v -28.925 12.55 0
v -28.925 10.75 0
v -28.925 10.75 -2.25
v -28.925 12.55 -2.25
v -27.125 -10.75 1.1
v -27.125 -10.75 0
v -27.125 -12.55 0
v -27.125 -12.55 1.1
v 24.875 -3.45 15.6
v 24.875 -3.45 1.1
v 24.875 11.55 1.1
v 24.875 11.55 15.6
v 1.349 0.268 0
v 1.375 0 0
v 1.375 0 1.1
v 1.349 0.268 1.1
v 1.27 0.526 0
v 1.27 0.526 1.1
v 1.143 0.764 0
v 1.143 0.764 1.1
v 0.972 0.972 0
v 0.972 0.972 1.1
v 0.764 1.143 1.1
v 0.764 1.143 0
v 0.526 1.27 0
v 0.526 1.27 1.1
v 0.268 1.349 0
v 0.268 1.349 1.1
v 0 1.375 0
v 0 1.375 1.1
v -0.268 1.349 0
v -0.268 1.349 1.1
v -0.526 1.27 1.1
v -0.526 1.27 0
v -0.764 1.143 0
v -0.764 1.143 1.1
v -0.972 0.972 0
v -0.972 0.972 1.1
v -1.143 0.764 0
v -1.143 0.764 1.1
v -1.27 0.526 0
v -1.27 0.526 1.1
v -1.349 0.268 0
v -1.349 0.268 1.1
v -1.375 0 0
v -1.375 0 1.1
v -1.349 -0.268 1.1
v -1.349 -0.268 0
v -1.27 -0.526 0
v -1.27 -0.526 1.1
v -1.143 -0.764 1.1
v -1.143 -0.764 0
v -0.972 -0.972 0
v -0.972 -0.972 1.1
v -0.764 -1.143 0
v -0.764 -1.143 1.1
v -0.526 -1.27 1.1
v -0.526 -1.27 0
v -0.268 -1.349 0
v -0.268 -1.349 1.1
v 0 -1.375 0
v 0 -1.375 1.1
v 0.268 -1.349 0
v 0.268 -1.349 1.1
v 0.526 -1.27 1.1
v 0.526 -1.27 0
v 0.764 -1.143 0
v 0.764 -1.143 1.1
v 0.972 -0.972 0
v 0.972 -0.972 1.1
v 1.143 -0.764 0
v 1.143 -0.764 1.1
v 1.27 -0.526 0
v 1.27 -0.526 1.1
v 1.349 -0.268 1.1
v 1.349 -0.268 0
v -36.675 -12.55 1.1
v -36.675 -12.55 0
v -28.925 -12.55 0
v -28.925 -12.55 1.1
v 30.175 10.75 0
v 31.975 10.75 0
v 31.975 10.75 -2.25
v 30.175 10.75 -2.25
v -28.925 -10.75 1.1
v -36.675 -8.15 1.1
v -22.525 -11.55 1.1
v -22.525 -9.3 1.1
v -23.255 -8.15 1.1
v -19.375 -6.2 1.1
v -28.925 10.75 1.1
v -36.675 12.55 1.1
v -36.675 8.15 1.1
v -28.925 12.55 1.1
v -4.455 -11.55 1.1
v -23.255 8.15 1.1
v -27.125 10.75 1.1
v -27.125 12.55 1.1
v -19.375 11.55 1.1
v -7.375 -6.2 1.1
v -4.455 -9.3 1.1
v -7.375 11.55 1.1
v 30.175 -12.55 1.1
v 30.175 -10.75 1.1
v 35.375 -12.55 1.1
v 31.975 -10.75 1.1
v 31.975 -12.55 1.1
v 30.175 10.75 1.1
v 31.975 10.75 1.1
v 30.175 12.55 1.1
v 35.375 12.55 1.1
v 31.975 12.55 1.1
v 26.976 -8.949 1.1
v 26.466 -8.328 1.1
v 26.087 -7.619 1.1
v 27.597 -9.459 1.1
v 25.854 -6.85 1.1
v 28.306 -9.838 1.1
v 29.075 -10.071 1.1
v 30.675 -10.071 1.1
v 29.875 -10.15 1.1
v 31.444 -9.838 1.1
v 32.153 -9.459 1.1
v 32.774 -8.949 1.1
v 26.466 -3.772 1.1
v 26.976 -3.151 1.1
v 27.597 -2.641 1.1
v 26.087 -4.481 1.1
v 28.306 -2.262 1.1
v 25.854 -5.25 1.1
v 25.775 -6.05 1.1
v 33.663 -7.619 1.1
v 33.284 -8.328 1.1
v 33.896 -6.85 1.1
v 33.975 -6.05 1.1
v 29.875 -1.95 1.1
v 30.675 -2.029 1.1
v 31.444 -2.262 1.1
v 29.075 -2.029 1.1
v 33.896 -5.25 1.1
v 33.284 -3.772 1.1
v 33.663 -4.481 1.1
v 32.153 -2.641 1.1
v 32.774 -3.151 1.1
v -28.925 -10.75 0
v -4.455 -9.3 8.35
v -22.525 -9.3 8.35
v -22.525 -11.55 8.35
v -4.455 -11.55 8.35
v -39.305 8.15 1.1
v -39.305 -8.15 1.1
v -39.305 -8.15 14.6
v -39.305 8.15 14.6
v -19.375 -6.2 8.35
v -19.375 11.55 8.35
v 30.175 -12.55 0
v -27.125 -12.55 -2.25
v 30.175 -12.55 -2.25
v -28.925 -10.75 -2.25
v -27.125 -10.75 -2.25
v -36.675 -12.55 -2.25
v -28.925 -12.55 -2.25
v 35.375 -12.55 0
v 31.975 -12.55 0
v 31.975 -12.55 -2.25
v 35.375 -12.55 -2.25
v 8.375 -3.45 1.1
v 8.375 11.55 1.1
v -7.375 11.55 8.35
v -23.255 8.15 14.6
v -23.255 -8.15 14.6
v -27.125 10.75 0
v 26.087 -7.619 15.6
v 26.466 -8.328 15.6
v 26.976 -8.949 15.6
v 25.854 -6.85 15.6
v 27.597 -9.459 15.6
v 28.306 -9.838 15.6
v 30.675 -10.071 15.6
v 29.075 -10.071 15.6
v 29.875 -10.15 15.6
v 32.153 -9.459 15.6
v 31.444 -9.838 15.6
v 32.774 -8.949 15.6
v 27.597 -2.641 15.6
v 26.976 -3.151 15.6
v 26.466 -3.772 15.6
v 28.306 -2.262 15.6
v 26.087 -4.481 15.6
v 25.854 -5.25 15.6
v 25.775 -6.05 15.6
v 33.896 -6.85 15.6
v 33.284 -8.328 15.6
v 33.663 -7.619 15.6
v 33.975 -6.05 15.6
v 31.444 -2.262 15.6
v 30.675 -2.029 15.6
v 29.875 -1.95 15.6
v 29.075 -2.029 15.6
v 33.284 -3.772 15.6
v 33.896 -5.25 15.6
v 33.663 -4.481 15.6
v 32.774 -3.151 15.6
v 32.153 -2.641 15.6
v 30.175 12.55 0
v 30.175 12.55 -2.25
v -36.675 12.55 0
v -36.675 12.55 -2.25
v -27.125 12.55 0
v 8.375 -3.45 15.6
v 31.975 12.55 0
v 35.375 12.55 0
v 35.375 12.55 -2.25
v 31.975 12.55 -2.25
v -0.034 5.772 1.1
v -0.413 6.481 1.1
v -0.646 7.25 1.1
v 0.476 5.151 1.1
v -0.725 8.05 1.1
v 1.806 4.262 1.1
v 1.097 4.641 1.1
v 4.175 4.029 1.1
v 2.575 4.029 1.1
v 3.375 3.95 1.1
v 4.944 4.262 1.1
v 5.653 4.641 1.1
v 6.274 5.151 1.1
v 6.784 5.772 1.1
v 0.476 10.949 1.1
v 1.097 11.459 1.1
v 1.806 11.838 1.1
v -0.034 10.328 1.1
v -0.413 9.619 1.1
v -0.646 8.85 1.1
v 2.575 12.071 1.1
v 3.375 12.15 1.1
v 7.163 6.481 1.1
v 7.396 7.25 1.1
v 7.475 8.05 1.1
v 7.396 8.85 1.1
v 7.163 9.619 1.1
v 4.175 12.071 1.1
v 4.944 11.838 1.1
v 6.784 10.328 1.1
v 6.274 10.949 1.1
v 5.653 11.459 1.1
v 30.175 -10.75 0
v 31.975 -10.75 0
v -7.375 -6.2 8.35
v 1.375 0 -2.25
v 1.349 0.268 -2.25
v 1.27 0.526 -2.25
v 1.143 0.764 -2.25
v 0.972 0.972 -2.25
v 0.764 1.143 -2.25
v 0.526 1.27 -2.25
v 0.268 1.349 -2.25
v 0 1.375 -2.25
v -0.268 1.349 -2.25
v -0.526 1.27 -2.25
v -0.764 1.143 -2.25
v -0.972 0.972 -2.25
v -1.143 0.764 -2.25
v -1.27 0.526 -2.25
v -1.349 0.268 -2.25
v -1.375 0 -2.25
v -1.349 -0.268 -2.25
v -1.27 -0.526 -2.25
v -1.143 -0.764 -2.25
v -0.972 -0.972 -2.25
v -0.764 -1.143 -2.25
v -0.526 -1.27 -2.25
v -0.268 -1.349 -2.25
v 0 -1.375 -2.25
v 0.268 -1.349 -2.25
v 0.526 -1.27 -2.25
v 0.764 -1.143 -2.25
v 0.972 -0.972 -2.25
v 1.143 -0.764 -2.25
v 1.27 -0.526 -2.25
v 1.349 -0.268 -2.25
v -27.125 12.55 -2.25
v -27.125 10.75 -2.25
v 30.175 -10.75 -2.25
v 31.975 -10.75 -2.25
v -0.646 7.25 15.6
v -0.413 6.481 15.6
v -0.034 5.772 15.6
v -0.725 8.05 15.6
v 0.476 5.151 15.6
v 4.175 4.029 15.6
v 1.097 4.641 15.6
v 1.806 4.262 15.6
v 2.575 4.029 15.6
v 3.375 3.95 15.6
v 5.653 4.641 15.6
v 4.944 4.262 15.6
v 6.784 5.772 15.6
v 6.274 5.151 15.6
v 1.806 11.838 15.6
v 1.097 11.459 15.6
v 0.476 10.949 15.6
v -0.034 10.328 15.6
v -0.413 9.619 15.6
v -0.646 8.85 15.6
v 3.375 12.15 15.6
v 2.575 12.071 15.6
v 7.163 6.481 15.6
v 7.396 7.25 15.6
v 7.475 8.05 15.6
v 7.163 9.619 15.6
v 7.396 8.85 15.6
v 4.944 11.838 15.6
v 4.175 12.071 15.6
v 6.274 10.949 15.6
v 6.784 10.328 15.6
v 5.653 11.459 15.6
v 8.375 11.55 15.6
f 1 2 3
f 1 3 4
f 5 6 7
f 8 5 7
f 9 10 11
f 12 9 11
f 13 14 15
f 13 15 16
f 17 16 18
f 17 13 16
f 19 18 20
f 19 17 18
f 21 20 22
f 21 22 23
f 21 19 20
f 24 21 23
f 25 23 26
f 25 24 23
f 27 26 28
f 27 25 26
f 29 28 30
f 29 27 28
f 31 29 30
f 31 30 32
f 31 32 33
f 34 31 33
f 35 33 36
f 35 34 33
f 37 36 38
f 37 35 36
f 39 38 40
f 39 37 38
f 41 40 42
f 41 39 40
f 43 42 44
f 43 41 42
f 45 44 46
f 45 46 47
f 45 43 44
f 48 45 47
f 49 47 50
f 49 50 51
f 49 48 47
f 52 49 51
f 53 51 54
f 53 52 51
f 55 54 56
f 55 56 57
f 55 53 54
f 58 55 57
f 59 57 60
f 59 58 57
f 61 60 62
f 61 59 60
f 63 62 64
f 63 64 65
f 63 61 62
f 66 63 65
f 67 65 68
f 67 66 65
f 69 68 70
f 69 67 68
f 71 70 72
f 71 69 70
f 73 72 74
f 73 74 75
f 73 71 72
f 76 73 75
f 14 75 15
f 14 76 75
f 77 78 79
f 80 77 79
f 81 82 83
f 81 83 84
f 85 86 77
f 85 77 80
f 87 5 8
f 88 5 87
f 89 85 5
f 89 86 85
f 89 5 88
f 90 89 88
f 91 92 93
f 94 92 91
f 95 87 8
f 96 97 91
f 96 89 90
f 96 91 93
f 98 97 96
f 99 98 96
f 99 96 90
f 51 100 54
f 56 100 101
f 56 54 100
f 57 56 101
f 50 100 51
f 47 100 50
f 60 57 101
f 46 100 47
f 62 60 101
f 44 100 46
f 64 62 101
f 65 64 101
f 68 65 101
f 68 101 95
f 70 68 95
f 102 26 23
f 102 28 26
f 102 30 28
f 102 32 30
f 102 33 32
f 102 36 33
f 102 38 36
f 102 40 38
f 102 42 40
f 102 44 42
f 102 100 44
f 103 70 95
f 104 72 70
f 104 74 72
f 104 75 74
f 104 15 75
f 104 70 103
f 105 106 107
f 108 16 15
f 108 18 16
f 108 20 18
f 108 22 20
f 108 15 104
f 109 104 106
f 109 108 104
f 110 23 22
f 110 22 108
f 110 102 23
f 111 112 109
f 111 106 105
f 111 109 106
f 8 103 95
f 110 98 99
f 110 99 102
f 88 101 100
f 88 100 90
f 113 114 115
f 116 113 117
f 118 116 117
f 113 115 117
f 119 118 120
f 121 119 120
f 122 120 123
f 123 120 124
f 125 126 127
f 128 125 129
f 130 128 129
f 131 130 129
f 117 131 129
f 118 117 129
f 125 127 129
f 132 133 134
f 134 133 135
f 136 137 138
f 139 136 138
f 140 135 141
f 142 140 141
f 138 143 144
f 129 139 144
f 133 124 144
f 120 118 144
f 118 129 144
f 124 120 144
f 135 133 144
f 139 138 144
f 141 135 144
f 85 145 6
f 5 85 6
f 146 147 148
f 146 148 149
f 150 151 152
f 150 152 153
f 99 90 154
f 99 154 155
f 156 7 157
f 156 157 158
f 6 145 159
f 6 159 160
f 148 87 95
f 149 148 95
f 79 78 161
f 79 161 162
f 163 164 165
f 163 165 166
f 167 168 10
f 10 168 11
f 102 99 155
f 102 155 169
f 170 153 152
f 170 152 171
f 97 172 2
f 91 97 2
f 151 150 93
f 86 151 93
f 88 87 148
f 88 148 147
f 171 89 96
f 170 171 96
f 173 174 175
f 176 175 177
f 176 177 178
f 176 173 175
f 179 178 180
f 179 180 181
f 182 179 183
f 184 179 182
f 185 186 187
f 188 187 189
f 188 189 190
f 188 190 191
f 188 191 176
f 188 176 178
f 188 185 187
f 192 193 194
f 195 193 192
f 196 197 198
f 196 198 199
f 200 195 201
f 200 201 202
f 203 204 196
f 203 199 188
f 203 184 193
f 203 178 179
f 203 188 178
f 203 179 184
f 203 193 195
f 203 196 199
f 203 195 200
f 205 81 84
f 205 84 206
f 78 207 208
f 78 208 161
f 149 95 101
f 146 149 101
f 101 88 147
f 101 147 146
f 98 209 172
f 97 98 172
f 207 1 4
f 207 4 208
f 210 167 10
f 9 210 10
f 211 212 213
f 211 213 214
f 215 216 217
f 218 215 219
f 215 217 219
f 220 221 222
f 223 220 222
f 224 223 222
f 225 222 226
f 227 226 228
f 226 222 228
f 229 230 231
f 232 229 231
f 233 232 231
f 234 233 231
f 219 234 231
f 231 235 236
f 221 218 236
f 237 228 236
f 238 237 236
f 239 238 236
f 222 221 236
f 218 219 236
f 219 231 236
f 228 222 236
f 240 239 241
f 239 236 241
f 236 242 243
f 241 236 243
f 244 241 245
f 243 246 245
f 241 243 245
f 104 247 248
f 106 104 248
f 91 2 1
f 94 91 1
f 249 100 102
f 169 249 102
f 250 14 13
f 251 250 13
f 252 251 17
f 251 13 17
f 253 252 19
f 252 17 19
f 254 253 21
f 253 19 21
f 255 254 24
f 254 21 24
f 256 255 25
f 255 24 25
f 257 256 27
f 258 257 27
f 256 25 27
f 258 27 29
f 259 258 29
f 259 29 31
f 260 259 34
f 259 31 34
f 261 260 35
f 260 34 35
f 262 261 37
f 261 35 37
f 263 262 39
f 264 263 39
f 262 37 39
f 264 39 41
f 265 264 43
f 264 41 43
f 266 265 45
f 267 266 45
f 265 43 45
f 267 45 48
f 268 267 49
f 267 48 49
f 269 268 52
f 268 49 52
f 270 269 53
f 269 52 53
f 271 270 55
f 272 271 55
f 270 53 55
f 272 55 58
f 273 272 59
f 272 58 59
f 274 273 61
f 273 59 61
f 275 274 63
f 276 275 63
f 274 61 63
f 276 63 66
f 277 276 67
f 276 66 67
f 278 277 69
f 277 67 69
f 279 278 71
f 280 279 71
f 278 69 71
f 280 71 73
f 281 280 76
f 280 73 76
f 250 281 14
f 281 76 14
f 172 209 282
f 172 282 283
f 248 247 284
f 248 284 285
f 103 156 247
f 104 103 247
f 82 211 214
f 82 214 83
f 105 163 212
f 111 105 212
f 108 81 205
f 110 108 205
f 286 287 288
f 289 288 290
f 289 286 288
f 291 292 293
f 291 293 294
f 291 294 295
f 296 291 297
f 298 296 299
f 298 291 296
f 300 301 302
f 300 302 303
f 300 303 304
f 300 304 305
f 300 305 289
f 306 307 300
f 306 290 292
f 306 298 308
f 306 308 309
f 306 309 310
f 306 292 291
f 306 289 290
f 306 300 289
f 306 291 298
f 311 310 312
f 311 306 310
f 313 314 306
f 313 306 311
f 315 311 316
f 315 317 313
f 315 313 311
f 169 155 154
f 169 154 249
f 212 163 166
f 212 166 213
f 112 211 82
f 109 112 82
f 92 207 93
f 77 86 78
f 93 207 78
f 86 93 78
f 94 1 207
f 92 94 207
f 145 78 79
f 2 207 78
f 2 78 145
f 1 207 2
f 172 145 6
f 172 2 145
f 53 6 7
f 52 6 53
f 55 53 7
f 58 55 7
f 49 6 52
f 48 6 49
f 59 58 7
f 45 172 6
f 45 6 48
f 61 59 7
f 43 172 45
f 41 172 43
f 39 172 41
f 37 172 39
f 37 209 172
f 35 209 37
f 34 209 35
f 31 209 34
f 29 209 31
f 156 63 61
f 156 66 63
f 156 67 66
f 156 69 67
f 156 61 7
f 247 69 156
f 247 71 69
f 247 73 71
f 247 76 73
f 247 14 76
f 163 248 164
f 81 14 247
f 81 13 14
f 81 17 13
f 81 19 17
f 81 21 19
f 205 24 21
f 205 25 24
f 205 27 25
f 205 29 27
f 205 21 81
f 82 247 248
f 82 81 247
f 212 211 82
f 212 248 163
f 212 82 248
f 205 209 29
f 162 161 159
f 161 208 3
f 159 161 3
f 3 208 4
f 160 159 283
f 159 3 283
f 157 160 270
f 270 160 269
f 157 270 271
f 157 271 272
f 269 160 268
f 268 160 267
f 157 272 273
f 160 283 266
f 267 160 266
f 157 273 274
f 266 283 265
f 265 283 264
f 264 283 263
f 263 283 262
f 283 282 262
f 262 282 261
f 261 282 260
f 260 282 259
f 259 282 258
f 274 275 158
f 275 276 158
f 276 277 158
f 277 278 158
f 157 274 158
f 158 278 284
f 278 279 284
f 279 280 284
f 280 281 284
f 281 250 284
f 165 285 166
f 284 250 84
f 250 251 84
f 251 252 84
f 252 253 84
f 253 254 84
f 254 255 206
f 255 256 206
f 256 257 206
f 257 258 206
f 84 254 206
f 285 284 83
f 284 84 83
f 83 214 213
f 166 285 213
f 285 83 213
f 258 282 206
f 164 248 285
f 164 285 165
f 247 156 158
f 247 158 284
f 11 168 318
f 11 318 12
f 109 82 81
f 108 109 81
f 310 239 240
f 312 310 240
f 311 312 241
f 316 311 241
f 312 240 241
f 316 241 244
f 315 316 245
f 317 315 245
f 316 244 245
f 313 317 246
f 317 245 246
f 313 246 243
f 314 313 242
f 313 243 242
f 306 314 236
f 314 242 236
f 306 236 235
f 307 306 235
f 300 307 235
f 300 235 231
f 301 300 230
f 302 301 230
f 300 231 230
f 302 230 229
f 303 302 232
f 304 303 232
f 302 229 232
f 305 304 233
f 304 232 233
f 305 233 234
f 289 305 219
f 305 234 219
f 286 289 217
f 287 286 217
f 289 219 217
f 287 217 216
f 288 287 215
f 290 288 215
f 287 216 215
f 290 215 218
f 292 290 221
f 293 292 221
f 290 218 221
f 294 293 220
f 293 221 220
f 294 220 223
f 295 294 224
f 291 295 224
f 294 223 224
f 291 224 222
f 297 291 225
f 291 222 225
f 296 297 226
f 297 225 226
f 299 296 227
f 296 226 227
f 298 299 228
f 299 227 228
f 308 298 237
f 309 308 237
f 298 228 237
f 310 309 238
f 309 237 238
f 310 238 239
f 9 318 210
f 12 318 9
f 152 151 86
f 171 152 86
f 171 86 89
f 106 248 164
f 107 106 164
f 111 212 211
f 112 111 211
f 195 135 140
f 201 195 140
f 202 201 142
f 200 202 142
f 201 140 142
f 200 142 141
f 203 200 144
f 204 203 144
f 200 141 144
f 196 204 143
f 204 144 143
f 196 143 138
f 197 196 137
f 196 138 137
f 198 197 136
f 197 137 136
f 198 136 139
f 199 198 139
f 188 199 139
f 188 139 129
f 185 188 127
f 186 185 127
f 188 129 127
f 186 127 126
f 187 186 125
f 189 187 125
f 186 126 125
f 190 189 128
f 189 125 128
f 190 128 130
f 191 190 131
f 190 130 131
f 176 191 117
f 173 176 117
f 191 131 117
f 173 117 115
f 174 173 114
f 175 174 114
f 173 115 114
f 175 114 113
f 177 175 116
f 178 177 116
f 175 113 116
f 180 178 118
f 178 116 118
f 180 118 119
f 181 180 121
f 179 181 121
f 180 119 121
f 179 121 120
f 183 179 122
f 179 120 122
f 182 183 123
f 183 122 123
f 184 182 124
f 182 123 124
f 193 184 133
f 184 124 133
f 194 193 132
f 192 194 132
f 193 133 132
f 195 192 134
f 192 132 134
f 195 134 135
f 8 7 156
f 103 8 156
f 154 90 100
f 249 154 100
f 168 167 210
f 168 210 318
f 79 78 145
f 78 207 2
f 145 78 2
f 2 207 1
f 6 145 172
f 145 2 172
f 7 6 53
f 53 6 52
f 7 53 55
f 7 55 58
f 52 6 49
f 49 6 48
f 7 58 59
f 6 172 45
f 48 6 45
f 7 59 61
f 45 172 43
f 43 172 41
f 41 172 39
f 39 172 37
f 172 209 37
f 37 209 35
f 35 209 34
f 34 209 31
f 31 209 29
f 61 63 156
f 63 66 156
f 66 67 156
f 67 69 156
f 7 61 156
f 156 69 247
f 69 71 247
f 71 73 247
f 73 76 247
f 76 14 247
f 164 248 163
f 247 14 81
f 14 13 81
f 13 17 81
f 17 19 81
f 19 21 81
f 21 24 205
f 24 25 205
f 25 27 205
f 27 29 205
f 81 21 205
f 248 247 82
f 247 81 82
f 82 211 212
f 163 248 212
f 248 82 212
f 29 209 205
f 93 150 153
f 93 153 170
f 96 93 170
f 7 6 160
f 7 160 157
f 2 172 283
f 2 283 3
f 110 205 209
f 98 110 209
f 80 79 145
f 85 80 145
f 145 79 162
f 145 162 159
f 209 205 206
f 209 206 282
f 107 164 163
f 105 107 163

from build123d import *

# Parameters (mm, degrees)
SKETCH1_R                 = 1.375
BOSS_BOARDTHK_DEPTH       = 1.1
SKETCH1_3_R               = 1.375
BOSS_LOWERCLEARANCE_DEPTH = 2.25
SKETCH2_R                 = 4.1
BOSS_EXTRUDE3_DEPTH       = 14.5
BOSS_EXTRUDE3_2_DEPTH     = 14.5
SKETCH2_W                 = 16.5
SKETCH2_H                 = 15
BOSS_EXTRUDE3_3_DEPTH     = 14.5
SKETCH2_4_W               = 12
SKETCH2_4_H               = 17.75
SKETCH2_4_W_2             = 18.07
SKETCH2_4_H_2             = 2.25
BOSS_EXTRUDE4_DEPTH       = 7.25
SKETCH2_5_W               = 16.05
SKETCH2_5_H               = 16.3
BOSS_EXTRUDE5_DEPTH       = 13.5


with BuildPart() as part:
    # Sketch1 → Boss-BoardThk (new body)
    with BuildSketch(Plane.XY):
        Polygon((-36.675, 12.55), (-36.675, -12.55), (-28.925, -12.55), (-28.925, -10.75), (-27.125, -10.75), (-27.125, -12.55), (30.175, -12.55), (30.175, -10.75), (31.975, -10.75), (31.975, -12.55), (35.375, -12.55), (35.375, 12.55), (31.975, 12.55), (31.975, 10.75), (30.175, 10.75), (30.175, 12.55), (-27.125, 12.55), (-27.125, 10.75), (-28.925, 10.75), (-28.925, 12.55), align=None)
        Circle(SKETCH1_R, mode=Mode.SUBTRACT)
    extrude(amount=BOSS_BOARDTHK_DEPTH)

    # Sketch2<4> → Boss-Extrude4 (add)
    with BuildSketch(Plane.XY.offset(1.1)):
        with Locations((-13.375, 2.675)):
            Rectangle(SKETCH2_4_W, SKETCH2_4_H)
        with Locations((-13.49, -10.425)):
            Rectangle(SKETCH2_4_W_2, SKETCH2_4_H_2)
    extrude(amount=BOSS_EXTRUDE4_DEPTH)

    # Sketch2<5> → Boss-Extrude5 (add)
    with BuildSketch(Plane.XY.offset(1.1)):
        with Locations((-31.28, 0)):
            Rectangle(SKETCH2_5_W, SKETCH2_5_H)
    extrude(amount=BOSS_EXTRUDE5_DEPTH)


with BuildPart() as body_2:
    # Sketch1<3> → Boss-LowerClearance (new body)
    with BuildSketch(Plane.XY):
        Polygon((-36.675, 12.55), (-36.675, -12.55), (-28.925, -12.55), (-28.925, -10.75), (-27.125, -10.75), (-27.125, -12.55), (30.175, -12.55), (30.175, -10.75), (31.975, -10.75), (31.975, -12.55), (35.375, -12.55), (35.375, 12.55), (31.975, 12.55), (31.975, 10.75), (30.175, 10.75), (30.175, 12.55), (-27.125, 12.55), (-27.125, 10.75), (-28.925, 10.75), (-28.925, 12.55), align=None)
        Circle(SKETCH1_3_R, mode=Mode.SUBTRACT)
    extrude(amount=-BOSS_LOWERCLEARANCE_DEPTH)


with BuildPart() as body_3:
    # Sketch2 → Boss-Extrude3 (new body)
    with BuildSketch(Plane.XY.offset(1.1)):
        with Locations((29.875, -6.05)):
            Circle(SKETCH2_R)
    extrude(amount=BOSS_EXTRUDE3_DEPTH)


with BuildPart() as body_4:
    # Sketch2 → Boss-Extrude3 2 (new body)
    with BuildSketch(Plane.XY.offset(1.1)):
        with Locations((3.375, 8.05)):
            Circle(SKETCH2_R)
    extrude(amount=BOSS_EXTRUDE3_2_DEPTH)


with BuildPart() as body_5:
    # Sketch2 → Boss-Extrude3 3 (new body)
    with BuildSketch(Plane.XY.offset(1.1)):
        with Locations((16.625, 4.05)):
            Rectangle(SKETCH2_W, SKETCH2_H)
    extrude(amount=BOSS_EXTRUDE3_3_DEPTH)


solid = Compound([part.part, body_2.part, body_3.part, body_4.part, body_5.part])
